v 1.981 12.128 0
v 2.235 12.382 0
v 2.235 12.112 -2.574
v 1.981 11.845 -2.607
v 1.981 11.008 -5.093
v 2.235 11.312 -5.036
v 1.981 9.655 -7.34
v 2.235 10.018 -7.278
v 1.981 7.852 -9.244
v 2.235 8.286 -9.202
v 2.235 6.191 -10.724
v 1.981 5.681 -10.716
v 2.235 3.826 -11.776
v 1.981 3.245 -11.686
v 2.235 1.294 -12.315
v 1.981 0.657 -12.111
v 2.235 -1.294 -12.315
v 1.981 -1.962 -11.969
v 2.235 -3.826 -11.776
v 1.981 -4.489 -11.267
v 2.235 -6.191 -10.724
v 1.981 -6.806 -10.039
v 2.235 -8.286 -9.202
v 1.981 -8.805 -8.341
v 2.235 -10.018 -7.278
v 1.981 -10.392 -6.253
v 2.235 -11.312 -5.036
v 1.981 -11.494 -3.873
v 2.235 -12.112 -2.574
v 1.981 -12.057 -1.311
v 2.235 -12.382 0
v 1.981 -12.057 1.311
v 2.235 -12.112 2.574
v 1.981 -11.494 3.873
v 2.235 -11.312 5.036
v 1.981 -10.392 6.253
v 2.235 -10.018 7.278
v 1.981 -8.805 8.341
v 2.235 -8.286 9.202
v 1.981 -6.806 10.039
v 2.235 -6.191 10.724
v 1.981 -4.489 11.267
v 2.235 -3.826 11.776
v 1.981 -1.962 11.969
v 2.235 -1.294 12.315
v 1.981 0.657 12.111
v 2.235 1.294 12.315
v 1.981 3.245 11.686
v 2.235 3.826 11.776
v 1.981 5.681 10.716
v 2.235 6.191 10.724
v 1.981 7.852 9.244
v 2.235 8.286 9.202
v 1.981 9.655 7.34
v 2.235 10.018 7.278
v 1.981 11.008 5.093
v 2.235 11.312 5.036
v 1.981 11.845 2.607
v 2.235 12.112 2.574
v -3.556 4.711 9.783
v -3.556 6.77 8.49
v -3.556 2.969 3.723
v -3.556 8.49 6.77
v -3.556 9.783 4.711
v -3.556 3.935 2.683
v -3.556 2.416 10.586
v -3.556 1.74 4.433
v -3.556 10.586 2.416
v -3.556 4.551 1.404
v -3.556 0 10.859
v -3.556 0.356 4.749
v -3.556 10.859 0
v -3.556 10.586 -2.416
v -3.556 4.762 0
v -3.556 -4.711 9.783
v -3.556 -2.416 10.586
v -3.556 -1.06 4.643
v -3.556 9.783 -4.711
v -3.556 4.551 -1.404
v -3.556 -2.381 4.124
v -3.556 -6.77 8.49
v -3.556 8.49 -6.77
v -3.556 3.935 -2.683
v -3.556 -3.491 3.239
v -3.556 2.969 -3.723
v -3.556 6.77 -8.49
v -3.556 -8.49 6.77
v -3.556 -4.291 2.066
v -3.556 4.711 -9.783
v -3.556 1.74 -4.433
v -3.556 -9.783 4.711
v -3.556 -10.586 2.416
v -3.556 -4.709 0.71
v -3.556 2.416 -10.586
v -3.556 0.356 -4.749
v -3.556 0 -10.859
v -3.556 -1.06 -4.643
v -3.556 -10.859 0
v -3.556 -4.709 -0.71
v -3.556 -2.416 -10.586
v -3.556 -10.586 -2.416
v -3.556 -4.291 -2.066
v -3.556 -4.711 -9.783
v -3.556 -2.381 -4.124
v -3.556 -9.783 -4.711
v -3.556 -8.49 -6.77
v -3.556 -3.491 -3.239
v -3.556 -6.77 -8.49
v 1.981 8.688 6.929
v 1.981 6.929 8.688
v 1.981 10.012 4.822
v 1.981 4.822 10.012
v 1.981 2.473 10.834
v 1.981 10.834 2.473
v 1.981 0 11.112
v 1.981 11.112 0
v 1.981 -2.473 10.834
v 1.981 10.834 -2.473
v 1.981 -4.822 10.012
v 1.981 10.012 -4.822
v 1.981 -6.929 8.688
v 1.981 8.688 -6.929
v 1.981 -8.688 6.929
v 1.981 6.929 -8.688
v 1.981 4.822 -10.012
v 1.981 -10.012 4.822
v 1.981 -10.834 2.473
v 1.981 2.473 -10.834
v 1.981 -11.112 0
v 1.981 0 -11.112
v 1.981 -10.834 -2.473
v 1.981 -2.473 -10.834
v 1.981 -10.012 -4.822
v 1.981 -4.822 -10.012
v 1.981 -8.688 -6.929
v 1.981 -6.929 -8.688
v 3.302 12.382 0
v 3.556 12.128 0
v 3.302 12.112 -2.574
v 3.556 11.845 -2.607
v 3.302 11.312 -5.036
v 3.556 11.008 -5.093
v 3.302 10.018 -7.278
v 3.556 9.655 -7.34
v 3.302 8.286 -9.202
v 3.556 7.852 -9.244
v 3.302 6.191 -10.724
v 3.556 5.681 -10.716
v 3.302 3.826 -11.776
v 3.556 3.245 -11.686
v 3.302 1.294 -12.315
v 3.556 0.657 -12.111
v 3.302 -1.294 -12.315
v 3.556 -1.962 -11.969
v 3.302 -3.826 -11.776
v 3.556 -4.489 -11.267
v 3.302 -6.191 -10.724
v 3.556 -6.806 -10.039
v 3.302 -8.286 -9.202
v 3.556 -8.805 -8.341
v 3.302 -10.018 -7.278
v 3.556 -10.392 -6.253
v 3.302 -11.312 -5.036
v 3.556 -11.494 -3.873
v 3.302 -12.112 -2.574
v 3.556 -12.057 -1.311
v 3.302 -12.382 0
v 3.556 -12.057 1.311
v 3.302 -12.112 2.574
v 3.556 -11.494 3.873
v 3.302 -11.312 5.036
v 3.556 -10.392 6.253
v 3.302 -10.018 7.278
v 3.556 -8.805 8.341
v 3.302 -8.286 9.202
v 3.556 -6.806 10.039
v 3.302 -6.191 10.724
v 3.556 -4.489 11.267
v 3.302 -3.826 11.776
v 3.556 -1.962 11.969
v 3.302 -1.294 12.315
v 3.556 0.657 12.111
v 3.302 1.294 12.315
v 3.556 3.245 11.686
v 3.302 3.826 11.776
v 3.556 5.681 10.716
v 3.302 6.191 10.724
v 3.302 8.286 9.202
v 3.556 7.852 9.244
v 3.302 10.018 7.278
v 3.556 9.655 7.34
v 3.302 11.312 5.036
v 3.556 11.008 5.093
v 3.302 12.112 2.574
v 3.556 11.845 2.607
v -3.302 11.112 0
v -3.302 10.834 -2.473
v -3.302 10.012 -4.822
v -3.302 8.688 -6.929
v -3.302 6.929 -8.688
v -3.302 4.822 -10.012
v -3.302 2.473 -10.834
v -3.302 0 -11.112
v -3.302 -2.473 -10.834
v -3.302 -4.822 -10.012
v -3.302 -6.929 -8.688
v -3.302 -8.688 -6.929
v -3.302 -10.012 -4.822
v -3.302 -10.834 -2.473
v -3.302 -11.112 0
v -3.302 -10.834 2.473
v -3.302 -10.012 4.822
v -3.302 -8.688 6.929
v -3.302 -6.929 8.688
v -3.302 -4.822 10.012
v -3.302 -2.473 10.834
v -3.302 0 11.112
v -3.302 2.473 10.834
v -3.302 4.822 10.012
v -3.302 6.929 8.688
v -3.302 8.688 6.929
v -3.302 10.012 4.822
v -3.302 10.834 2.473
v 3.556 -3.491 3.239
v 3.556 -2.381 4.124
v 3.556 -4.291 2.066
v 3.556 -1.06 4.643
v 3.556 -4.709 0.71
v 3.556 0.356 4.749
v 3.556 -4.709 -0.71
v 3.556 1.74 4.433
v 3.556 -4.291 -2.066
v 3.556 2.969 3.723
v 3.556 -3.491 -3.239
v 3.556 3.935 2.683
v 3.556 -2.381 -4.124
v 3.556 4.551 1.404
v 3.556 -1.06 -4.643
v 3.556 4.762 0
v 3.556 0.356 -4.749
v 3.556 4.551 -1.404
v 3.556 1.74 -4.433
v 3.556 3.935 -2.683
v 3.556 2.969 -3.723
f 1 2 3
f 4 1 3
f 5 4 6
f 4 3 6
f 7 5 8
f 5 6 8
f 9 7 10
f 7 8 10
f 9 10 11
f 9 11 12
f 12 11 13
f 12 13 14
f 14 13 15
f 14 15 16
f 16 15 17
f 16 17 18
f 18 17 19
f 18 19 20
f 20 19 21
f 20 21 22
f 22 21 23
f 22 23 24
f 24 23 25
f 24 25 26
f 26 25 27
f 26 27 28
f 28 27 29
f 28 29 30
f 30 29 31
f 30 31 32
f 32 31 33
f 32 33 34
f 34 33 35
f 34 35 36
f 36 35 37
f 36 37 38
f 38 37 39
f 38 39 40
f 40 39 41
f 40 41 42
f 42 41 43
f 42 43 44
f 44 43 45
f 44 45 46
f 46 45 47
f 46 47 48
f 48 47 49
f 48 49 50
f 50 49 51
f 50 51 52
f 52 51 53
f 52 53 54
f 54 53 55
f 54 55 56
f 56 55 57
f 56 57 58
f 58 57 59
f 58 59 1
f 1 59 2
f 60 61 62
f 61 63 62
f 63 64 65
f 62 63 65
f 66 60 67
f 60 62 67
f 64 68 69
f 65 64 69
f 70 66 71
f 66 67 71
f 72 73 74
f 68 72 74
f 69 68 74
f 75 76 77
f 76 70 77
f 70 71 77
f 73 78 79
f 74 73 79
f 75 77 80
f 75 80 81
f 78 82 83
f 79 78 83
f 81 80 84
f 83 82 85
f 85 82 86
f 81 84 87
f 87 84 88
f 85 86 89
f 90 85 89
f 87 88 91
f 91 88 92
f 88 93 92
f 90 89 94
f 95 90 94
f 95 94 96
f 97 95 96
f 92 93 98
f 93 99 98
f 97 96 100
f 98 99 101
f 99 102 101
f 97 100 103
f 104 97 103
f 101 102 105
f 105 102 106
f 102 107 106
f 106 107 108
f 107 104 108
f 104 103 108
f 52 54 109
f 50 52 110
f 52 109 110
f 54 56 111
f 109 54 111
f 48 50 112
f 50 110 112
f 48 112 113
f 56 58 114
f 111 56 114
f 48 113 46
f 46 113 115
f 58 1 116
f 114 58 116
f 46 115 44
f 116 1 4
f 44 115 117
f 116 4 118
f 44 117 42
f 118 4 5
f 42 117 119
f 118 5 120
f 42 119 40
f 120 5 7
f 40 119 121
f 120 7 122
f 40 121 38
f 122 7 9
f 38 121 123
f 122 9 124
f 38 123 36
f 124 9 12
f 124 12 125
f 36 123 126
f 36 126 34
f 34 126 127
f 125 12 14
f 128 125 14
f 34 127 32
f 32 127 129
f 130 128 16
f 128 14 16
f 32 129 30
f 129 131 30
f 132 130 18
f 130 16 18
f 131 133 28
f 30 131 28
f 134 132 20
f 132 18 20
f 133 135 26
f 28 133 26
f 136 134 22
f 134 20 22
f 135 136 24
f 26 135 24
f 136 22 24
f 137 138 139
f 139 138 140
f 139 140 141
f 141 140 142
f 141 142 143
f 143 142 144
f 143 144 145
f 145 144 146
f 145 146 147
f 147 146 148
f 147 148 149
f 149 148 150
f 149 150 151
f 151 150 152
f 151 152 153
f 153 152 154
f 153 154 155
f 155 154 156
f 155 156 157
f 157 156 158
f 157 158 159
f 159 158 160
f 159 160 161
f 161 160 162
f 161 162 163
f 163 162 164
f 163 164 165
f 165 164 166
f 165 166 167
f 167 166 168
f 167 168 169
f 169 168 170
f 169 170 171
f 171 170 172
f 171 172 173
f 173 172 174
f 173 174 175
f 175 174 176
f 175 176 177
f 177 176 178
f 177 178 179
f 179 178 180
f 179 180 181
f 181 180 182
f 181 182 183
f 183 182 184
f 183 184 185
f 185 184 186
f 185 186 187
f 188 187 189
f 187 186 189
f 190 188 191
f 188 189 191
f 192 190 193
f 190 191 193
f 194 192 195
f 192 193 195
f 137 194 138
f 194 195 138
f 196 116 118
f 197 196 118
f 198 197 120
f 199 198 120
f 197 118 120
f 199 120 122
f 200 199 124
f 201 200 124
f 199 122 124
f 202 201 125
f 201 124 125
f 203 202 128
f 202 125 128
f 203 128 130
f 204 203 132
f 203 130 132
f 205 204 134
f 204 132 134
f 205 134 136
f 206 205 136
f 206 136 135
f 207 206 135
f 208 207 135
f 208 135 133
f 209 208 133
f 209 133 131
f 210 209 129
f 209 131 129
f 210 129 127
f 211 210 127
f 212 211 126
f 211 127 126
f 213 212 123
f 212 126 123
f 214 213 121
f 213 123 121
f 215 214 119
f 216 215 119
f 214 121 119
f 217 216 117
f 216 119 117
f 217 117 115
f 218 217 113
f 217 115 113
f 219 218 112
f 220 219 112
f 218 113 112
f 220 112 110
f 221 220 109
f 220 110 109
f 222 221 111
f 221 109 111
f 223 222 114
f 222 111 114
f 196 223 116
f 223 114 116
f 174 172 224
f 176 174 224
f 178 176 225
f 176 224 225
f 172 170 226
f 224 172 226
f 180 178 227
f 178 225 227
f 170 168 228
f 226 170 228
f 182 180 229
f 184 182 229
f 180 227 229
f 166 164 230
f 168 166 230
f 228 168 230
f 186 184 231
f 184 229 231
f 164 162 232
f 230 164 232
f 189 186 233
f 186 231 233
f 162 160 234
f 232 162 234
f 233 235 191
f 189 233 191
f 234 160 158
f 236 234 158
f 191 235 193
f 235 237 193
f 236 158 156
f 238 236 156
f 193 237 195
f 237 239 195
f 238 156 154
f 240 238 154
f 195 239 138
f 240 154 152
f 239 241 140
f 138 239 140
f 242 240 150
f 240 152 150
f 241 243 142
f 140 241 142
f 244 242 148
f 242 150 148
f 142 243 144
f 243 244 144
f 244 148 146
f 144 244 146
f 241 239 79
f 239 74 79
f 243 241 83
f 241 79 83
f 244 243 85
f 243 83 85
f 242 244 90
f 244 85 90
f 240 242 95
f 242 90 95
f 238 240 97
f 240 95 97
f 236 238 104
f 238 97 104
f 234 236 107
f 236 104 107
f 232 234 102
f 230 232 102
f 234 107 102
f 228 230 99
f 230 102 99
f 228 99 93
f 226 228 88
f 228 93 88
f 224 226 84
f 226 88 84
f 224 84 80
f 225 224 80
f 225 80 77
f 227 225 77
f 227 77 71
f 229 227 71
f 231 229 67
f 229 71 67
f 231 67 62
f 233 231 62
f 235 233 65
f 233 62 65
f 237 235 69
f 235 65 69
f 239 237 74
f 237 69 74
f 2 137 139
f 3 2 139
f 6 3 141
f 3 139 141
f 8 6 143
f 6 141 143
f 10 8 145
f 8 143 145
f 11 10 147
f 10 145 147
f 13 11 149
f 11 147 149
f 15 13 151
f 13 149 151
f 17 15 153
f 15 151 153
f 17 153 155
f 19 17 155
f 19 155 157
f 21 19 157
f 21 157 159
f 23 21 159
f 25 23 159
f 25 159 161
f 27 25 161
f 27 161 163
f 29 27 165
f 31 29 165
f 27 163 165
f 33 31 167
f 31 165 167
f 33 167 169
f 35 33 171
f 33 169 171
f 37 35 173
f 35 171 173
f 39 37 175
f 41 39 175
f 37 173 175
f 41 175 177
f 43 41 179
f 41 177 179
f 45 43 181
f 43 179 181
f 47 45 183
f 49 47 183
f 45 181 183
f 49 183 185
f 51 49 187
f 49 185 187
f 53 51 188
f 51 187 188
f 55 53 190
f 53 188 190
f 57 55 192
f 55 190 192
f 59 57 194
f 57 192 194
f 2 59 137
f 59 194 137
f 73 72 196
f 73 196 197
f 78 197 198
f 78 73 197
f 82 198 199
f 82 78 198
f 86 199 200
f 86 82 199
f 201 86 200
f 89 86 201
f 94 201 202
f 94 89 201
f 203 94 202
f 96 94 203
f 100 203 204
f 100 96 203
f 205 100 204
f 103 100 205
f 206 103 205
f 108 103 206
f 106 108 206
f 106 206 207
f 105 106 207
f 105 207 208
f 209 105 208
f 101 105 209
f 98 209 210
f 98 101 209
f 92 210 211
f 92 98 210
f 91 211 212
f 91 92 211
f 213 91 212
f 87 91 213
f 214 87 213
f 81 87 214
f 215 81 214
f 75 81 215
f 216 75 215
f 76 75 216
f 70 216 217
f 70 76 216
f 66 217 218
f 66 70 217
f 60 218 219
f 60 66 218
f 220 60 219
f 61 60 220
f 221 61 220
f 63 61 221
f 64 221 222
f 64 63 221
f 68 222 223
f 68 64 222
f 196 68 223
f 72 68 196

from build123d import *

# Parameters (mm, degrees)
CHAMFER1_SIZE = 0.254


with BuildPart() as part:
    # Sketch1 → Revolve1 (revolve)
    with BuildSketch(Plane.XY):
        Polygon((-3.556, 11.1125), (1.9812, 11.1125), (1.9812, 12.3825), (3.556, 12.3825), (3.556, 4.7625), (-3.556, 4.7625), align=None)
    revolve(axis=Axis((3.556, 0, 0), (-1, 0, 0)))

    # Chamfer1
    chamfer1_edges = [part.edges().sort_by_distance(p)[0] for p in [
        (-3.556, -11.1125, 0),
        (1.9812, -12.3825, 0),
        (3.556, -12.3825, 0),
    ]]
    chamfer(chamfer1_edges, length=CHAMFER1_SIZE)


solid = part.part
